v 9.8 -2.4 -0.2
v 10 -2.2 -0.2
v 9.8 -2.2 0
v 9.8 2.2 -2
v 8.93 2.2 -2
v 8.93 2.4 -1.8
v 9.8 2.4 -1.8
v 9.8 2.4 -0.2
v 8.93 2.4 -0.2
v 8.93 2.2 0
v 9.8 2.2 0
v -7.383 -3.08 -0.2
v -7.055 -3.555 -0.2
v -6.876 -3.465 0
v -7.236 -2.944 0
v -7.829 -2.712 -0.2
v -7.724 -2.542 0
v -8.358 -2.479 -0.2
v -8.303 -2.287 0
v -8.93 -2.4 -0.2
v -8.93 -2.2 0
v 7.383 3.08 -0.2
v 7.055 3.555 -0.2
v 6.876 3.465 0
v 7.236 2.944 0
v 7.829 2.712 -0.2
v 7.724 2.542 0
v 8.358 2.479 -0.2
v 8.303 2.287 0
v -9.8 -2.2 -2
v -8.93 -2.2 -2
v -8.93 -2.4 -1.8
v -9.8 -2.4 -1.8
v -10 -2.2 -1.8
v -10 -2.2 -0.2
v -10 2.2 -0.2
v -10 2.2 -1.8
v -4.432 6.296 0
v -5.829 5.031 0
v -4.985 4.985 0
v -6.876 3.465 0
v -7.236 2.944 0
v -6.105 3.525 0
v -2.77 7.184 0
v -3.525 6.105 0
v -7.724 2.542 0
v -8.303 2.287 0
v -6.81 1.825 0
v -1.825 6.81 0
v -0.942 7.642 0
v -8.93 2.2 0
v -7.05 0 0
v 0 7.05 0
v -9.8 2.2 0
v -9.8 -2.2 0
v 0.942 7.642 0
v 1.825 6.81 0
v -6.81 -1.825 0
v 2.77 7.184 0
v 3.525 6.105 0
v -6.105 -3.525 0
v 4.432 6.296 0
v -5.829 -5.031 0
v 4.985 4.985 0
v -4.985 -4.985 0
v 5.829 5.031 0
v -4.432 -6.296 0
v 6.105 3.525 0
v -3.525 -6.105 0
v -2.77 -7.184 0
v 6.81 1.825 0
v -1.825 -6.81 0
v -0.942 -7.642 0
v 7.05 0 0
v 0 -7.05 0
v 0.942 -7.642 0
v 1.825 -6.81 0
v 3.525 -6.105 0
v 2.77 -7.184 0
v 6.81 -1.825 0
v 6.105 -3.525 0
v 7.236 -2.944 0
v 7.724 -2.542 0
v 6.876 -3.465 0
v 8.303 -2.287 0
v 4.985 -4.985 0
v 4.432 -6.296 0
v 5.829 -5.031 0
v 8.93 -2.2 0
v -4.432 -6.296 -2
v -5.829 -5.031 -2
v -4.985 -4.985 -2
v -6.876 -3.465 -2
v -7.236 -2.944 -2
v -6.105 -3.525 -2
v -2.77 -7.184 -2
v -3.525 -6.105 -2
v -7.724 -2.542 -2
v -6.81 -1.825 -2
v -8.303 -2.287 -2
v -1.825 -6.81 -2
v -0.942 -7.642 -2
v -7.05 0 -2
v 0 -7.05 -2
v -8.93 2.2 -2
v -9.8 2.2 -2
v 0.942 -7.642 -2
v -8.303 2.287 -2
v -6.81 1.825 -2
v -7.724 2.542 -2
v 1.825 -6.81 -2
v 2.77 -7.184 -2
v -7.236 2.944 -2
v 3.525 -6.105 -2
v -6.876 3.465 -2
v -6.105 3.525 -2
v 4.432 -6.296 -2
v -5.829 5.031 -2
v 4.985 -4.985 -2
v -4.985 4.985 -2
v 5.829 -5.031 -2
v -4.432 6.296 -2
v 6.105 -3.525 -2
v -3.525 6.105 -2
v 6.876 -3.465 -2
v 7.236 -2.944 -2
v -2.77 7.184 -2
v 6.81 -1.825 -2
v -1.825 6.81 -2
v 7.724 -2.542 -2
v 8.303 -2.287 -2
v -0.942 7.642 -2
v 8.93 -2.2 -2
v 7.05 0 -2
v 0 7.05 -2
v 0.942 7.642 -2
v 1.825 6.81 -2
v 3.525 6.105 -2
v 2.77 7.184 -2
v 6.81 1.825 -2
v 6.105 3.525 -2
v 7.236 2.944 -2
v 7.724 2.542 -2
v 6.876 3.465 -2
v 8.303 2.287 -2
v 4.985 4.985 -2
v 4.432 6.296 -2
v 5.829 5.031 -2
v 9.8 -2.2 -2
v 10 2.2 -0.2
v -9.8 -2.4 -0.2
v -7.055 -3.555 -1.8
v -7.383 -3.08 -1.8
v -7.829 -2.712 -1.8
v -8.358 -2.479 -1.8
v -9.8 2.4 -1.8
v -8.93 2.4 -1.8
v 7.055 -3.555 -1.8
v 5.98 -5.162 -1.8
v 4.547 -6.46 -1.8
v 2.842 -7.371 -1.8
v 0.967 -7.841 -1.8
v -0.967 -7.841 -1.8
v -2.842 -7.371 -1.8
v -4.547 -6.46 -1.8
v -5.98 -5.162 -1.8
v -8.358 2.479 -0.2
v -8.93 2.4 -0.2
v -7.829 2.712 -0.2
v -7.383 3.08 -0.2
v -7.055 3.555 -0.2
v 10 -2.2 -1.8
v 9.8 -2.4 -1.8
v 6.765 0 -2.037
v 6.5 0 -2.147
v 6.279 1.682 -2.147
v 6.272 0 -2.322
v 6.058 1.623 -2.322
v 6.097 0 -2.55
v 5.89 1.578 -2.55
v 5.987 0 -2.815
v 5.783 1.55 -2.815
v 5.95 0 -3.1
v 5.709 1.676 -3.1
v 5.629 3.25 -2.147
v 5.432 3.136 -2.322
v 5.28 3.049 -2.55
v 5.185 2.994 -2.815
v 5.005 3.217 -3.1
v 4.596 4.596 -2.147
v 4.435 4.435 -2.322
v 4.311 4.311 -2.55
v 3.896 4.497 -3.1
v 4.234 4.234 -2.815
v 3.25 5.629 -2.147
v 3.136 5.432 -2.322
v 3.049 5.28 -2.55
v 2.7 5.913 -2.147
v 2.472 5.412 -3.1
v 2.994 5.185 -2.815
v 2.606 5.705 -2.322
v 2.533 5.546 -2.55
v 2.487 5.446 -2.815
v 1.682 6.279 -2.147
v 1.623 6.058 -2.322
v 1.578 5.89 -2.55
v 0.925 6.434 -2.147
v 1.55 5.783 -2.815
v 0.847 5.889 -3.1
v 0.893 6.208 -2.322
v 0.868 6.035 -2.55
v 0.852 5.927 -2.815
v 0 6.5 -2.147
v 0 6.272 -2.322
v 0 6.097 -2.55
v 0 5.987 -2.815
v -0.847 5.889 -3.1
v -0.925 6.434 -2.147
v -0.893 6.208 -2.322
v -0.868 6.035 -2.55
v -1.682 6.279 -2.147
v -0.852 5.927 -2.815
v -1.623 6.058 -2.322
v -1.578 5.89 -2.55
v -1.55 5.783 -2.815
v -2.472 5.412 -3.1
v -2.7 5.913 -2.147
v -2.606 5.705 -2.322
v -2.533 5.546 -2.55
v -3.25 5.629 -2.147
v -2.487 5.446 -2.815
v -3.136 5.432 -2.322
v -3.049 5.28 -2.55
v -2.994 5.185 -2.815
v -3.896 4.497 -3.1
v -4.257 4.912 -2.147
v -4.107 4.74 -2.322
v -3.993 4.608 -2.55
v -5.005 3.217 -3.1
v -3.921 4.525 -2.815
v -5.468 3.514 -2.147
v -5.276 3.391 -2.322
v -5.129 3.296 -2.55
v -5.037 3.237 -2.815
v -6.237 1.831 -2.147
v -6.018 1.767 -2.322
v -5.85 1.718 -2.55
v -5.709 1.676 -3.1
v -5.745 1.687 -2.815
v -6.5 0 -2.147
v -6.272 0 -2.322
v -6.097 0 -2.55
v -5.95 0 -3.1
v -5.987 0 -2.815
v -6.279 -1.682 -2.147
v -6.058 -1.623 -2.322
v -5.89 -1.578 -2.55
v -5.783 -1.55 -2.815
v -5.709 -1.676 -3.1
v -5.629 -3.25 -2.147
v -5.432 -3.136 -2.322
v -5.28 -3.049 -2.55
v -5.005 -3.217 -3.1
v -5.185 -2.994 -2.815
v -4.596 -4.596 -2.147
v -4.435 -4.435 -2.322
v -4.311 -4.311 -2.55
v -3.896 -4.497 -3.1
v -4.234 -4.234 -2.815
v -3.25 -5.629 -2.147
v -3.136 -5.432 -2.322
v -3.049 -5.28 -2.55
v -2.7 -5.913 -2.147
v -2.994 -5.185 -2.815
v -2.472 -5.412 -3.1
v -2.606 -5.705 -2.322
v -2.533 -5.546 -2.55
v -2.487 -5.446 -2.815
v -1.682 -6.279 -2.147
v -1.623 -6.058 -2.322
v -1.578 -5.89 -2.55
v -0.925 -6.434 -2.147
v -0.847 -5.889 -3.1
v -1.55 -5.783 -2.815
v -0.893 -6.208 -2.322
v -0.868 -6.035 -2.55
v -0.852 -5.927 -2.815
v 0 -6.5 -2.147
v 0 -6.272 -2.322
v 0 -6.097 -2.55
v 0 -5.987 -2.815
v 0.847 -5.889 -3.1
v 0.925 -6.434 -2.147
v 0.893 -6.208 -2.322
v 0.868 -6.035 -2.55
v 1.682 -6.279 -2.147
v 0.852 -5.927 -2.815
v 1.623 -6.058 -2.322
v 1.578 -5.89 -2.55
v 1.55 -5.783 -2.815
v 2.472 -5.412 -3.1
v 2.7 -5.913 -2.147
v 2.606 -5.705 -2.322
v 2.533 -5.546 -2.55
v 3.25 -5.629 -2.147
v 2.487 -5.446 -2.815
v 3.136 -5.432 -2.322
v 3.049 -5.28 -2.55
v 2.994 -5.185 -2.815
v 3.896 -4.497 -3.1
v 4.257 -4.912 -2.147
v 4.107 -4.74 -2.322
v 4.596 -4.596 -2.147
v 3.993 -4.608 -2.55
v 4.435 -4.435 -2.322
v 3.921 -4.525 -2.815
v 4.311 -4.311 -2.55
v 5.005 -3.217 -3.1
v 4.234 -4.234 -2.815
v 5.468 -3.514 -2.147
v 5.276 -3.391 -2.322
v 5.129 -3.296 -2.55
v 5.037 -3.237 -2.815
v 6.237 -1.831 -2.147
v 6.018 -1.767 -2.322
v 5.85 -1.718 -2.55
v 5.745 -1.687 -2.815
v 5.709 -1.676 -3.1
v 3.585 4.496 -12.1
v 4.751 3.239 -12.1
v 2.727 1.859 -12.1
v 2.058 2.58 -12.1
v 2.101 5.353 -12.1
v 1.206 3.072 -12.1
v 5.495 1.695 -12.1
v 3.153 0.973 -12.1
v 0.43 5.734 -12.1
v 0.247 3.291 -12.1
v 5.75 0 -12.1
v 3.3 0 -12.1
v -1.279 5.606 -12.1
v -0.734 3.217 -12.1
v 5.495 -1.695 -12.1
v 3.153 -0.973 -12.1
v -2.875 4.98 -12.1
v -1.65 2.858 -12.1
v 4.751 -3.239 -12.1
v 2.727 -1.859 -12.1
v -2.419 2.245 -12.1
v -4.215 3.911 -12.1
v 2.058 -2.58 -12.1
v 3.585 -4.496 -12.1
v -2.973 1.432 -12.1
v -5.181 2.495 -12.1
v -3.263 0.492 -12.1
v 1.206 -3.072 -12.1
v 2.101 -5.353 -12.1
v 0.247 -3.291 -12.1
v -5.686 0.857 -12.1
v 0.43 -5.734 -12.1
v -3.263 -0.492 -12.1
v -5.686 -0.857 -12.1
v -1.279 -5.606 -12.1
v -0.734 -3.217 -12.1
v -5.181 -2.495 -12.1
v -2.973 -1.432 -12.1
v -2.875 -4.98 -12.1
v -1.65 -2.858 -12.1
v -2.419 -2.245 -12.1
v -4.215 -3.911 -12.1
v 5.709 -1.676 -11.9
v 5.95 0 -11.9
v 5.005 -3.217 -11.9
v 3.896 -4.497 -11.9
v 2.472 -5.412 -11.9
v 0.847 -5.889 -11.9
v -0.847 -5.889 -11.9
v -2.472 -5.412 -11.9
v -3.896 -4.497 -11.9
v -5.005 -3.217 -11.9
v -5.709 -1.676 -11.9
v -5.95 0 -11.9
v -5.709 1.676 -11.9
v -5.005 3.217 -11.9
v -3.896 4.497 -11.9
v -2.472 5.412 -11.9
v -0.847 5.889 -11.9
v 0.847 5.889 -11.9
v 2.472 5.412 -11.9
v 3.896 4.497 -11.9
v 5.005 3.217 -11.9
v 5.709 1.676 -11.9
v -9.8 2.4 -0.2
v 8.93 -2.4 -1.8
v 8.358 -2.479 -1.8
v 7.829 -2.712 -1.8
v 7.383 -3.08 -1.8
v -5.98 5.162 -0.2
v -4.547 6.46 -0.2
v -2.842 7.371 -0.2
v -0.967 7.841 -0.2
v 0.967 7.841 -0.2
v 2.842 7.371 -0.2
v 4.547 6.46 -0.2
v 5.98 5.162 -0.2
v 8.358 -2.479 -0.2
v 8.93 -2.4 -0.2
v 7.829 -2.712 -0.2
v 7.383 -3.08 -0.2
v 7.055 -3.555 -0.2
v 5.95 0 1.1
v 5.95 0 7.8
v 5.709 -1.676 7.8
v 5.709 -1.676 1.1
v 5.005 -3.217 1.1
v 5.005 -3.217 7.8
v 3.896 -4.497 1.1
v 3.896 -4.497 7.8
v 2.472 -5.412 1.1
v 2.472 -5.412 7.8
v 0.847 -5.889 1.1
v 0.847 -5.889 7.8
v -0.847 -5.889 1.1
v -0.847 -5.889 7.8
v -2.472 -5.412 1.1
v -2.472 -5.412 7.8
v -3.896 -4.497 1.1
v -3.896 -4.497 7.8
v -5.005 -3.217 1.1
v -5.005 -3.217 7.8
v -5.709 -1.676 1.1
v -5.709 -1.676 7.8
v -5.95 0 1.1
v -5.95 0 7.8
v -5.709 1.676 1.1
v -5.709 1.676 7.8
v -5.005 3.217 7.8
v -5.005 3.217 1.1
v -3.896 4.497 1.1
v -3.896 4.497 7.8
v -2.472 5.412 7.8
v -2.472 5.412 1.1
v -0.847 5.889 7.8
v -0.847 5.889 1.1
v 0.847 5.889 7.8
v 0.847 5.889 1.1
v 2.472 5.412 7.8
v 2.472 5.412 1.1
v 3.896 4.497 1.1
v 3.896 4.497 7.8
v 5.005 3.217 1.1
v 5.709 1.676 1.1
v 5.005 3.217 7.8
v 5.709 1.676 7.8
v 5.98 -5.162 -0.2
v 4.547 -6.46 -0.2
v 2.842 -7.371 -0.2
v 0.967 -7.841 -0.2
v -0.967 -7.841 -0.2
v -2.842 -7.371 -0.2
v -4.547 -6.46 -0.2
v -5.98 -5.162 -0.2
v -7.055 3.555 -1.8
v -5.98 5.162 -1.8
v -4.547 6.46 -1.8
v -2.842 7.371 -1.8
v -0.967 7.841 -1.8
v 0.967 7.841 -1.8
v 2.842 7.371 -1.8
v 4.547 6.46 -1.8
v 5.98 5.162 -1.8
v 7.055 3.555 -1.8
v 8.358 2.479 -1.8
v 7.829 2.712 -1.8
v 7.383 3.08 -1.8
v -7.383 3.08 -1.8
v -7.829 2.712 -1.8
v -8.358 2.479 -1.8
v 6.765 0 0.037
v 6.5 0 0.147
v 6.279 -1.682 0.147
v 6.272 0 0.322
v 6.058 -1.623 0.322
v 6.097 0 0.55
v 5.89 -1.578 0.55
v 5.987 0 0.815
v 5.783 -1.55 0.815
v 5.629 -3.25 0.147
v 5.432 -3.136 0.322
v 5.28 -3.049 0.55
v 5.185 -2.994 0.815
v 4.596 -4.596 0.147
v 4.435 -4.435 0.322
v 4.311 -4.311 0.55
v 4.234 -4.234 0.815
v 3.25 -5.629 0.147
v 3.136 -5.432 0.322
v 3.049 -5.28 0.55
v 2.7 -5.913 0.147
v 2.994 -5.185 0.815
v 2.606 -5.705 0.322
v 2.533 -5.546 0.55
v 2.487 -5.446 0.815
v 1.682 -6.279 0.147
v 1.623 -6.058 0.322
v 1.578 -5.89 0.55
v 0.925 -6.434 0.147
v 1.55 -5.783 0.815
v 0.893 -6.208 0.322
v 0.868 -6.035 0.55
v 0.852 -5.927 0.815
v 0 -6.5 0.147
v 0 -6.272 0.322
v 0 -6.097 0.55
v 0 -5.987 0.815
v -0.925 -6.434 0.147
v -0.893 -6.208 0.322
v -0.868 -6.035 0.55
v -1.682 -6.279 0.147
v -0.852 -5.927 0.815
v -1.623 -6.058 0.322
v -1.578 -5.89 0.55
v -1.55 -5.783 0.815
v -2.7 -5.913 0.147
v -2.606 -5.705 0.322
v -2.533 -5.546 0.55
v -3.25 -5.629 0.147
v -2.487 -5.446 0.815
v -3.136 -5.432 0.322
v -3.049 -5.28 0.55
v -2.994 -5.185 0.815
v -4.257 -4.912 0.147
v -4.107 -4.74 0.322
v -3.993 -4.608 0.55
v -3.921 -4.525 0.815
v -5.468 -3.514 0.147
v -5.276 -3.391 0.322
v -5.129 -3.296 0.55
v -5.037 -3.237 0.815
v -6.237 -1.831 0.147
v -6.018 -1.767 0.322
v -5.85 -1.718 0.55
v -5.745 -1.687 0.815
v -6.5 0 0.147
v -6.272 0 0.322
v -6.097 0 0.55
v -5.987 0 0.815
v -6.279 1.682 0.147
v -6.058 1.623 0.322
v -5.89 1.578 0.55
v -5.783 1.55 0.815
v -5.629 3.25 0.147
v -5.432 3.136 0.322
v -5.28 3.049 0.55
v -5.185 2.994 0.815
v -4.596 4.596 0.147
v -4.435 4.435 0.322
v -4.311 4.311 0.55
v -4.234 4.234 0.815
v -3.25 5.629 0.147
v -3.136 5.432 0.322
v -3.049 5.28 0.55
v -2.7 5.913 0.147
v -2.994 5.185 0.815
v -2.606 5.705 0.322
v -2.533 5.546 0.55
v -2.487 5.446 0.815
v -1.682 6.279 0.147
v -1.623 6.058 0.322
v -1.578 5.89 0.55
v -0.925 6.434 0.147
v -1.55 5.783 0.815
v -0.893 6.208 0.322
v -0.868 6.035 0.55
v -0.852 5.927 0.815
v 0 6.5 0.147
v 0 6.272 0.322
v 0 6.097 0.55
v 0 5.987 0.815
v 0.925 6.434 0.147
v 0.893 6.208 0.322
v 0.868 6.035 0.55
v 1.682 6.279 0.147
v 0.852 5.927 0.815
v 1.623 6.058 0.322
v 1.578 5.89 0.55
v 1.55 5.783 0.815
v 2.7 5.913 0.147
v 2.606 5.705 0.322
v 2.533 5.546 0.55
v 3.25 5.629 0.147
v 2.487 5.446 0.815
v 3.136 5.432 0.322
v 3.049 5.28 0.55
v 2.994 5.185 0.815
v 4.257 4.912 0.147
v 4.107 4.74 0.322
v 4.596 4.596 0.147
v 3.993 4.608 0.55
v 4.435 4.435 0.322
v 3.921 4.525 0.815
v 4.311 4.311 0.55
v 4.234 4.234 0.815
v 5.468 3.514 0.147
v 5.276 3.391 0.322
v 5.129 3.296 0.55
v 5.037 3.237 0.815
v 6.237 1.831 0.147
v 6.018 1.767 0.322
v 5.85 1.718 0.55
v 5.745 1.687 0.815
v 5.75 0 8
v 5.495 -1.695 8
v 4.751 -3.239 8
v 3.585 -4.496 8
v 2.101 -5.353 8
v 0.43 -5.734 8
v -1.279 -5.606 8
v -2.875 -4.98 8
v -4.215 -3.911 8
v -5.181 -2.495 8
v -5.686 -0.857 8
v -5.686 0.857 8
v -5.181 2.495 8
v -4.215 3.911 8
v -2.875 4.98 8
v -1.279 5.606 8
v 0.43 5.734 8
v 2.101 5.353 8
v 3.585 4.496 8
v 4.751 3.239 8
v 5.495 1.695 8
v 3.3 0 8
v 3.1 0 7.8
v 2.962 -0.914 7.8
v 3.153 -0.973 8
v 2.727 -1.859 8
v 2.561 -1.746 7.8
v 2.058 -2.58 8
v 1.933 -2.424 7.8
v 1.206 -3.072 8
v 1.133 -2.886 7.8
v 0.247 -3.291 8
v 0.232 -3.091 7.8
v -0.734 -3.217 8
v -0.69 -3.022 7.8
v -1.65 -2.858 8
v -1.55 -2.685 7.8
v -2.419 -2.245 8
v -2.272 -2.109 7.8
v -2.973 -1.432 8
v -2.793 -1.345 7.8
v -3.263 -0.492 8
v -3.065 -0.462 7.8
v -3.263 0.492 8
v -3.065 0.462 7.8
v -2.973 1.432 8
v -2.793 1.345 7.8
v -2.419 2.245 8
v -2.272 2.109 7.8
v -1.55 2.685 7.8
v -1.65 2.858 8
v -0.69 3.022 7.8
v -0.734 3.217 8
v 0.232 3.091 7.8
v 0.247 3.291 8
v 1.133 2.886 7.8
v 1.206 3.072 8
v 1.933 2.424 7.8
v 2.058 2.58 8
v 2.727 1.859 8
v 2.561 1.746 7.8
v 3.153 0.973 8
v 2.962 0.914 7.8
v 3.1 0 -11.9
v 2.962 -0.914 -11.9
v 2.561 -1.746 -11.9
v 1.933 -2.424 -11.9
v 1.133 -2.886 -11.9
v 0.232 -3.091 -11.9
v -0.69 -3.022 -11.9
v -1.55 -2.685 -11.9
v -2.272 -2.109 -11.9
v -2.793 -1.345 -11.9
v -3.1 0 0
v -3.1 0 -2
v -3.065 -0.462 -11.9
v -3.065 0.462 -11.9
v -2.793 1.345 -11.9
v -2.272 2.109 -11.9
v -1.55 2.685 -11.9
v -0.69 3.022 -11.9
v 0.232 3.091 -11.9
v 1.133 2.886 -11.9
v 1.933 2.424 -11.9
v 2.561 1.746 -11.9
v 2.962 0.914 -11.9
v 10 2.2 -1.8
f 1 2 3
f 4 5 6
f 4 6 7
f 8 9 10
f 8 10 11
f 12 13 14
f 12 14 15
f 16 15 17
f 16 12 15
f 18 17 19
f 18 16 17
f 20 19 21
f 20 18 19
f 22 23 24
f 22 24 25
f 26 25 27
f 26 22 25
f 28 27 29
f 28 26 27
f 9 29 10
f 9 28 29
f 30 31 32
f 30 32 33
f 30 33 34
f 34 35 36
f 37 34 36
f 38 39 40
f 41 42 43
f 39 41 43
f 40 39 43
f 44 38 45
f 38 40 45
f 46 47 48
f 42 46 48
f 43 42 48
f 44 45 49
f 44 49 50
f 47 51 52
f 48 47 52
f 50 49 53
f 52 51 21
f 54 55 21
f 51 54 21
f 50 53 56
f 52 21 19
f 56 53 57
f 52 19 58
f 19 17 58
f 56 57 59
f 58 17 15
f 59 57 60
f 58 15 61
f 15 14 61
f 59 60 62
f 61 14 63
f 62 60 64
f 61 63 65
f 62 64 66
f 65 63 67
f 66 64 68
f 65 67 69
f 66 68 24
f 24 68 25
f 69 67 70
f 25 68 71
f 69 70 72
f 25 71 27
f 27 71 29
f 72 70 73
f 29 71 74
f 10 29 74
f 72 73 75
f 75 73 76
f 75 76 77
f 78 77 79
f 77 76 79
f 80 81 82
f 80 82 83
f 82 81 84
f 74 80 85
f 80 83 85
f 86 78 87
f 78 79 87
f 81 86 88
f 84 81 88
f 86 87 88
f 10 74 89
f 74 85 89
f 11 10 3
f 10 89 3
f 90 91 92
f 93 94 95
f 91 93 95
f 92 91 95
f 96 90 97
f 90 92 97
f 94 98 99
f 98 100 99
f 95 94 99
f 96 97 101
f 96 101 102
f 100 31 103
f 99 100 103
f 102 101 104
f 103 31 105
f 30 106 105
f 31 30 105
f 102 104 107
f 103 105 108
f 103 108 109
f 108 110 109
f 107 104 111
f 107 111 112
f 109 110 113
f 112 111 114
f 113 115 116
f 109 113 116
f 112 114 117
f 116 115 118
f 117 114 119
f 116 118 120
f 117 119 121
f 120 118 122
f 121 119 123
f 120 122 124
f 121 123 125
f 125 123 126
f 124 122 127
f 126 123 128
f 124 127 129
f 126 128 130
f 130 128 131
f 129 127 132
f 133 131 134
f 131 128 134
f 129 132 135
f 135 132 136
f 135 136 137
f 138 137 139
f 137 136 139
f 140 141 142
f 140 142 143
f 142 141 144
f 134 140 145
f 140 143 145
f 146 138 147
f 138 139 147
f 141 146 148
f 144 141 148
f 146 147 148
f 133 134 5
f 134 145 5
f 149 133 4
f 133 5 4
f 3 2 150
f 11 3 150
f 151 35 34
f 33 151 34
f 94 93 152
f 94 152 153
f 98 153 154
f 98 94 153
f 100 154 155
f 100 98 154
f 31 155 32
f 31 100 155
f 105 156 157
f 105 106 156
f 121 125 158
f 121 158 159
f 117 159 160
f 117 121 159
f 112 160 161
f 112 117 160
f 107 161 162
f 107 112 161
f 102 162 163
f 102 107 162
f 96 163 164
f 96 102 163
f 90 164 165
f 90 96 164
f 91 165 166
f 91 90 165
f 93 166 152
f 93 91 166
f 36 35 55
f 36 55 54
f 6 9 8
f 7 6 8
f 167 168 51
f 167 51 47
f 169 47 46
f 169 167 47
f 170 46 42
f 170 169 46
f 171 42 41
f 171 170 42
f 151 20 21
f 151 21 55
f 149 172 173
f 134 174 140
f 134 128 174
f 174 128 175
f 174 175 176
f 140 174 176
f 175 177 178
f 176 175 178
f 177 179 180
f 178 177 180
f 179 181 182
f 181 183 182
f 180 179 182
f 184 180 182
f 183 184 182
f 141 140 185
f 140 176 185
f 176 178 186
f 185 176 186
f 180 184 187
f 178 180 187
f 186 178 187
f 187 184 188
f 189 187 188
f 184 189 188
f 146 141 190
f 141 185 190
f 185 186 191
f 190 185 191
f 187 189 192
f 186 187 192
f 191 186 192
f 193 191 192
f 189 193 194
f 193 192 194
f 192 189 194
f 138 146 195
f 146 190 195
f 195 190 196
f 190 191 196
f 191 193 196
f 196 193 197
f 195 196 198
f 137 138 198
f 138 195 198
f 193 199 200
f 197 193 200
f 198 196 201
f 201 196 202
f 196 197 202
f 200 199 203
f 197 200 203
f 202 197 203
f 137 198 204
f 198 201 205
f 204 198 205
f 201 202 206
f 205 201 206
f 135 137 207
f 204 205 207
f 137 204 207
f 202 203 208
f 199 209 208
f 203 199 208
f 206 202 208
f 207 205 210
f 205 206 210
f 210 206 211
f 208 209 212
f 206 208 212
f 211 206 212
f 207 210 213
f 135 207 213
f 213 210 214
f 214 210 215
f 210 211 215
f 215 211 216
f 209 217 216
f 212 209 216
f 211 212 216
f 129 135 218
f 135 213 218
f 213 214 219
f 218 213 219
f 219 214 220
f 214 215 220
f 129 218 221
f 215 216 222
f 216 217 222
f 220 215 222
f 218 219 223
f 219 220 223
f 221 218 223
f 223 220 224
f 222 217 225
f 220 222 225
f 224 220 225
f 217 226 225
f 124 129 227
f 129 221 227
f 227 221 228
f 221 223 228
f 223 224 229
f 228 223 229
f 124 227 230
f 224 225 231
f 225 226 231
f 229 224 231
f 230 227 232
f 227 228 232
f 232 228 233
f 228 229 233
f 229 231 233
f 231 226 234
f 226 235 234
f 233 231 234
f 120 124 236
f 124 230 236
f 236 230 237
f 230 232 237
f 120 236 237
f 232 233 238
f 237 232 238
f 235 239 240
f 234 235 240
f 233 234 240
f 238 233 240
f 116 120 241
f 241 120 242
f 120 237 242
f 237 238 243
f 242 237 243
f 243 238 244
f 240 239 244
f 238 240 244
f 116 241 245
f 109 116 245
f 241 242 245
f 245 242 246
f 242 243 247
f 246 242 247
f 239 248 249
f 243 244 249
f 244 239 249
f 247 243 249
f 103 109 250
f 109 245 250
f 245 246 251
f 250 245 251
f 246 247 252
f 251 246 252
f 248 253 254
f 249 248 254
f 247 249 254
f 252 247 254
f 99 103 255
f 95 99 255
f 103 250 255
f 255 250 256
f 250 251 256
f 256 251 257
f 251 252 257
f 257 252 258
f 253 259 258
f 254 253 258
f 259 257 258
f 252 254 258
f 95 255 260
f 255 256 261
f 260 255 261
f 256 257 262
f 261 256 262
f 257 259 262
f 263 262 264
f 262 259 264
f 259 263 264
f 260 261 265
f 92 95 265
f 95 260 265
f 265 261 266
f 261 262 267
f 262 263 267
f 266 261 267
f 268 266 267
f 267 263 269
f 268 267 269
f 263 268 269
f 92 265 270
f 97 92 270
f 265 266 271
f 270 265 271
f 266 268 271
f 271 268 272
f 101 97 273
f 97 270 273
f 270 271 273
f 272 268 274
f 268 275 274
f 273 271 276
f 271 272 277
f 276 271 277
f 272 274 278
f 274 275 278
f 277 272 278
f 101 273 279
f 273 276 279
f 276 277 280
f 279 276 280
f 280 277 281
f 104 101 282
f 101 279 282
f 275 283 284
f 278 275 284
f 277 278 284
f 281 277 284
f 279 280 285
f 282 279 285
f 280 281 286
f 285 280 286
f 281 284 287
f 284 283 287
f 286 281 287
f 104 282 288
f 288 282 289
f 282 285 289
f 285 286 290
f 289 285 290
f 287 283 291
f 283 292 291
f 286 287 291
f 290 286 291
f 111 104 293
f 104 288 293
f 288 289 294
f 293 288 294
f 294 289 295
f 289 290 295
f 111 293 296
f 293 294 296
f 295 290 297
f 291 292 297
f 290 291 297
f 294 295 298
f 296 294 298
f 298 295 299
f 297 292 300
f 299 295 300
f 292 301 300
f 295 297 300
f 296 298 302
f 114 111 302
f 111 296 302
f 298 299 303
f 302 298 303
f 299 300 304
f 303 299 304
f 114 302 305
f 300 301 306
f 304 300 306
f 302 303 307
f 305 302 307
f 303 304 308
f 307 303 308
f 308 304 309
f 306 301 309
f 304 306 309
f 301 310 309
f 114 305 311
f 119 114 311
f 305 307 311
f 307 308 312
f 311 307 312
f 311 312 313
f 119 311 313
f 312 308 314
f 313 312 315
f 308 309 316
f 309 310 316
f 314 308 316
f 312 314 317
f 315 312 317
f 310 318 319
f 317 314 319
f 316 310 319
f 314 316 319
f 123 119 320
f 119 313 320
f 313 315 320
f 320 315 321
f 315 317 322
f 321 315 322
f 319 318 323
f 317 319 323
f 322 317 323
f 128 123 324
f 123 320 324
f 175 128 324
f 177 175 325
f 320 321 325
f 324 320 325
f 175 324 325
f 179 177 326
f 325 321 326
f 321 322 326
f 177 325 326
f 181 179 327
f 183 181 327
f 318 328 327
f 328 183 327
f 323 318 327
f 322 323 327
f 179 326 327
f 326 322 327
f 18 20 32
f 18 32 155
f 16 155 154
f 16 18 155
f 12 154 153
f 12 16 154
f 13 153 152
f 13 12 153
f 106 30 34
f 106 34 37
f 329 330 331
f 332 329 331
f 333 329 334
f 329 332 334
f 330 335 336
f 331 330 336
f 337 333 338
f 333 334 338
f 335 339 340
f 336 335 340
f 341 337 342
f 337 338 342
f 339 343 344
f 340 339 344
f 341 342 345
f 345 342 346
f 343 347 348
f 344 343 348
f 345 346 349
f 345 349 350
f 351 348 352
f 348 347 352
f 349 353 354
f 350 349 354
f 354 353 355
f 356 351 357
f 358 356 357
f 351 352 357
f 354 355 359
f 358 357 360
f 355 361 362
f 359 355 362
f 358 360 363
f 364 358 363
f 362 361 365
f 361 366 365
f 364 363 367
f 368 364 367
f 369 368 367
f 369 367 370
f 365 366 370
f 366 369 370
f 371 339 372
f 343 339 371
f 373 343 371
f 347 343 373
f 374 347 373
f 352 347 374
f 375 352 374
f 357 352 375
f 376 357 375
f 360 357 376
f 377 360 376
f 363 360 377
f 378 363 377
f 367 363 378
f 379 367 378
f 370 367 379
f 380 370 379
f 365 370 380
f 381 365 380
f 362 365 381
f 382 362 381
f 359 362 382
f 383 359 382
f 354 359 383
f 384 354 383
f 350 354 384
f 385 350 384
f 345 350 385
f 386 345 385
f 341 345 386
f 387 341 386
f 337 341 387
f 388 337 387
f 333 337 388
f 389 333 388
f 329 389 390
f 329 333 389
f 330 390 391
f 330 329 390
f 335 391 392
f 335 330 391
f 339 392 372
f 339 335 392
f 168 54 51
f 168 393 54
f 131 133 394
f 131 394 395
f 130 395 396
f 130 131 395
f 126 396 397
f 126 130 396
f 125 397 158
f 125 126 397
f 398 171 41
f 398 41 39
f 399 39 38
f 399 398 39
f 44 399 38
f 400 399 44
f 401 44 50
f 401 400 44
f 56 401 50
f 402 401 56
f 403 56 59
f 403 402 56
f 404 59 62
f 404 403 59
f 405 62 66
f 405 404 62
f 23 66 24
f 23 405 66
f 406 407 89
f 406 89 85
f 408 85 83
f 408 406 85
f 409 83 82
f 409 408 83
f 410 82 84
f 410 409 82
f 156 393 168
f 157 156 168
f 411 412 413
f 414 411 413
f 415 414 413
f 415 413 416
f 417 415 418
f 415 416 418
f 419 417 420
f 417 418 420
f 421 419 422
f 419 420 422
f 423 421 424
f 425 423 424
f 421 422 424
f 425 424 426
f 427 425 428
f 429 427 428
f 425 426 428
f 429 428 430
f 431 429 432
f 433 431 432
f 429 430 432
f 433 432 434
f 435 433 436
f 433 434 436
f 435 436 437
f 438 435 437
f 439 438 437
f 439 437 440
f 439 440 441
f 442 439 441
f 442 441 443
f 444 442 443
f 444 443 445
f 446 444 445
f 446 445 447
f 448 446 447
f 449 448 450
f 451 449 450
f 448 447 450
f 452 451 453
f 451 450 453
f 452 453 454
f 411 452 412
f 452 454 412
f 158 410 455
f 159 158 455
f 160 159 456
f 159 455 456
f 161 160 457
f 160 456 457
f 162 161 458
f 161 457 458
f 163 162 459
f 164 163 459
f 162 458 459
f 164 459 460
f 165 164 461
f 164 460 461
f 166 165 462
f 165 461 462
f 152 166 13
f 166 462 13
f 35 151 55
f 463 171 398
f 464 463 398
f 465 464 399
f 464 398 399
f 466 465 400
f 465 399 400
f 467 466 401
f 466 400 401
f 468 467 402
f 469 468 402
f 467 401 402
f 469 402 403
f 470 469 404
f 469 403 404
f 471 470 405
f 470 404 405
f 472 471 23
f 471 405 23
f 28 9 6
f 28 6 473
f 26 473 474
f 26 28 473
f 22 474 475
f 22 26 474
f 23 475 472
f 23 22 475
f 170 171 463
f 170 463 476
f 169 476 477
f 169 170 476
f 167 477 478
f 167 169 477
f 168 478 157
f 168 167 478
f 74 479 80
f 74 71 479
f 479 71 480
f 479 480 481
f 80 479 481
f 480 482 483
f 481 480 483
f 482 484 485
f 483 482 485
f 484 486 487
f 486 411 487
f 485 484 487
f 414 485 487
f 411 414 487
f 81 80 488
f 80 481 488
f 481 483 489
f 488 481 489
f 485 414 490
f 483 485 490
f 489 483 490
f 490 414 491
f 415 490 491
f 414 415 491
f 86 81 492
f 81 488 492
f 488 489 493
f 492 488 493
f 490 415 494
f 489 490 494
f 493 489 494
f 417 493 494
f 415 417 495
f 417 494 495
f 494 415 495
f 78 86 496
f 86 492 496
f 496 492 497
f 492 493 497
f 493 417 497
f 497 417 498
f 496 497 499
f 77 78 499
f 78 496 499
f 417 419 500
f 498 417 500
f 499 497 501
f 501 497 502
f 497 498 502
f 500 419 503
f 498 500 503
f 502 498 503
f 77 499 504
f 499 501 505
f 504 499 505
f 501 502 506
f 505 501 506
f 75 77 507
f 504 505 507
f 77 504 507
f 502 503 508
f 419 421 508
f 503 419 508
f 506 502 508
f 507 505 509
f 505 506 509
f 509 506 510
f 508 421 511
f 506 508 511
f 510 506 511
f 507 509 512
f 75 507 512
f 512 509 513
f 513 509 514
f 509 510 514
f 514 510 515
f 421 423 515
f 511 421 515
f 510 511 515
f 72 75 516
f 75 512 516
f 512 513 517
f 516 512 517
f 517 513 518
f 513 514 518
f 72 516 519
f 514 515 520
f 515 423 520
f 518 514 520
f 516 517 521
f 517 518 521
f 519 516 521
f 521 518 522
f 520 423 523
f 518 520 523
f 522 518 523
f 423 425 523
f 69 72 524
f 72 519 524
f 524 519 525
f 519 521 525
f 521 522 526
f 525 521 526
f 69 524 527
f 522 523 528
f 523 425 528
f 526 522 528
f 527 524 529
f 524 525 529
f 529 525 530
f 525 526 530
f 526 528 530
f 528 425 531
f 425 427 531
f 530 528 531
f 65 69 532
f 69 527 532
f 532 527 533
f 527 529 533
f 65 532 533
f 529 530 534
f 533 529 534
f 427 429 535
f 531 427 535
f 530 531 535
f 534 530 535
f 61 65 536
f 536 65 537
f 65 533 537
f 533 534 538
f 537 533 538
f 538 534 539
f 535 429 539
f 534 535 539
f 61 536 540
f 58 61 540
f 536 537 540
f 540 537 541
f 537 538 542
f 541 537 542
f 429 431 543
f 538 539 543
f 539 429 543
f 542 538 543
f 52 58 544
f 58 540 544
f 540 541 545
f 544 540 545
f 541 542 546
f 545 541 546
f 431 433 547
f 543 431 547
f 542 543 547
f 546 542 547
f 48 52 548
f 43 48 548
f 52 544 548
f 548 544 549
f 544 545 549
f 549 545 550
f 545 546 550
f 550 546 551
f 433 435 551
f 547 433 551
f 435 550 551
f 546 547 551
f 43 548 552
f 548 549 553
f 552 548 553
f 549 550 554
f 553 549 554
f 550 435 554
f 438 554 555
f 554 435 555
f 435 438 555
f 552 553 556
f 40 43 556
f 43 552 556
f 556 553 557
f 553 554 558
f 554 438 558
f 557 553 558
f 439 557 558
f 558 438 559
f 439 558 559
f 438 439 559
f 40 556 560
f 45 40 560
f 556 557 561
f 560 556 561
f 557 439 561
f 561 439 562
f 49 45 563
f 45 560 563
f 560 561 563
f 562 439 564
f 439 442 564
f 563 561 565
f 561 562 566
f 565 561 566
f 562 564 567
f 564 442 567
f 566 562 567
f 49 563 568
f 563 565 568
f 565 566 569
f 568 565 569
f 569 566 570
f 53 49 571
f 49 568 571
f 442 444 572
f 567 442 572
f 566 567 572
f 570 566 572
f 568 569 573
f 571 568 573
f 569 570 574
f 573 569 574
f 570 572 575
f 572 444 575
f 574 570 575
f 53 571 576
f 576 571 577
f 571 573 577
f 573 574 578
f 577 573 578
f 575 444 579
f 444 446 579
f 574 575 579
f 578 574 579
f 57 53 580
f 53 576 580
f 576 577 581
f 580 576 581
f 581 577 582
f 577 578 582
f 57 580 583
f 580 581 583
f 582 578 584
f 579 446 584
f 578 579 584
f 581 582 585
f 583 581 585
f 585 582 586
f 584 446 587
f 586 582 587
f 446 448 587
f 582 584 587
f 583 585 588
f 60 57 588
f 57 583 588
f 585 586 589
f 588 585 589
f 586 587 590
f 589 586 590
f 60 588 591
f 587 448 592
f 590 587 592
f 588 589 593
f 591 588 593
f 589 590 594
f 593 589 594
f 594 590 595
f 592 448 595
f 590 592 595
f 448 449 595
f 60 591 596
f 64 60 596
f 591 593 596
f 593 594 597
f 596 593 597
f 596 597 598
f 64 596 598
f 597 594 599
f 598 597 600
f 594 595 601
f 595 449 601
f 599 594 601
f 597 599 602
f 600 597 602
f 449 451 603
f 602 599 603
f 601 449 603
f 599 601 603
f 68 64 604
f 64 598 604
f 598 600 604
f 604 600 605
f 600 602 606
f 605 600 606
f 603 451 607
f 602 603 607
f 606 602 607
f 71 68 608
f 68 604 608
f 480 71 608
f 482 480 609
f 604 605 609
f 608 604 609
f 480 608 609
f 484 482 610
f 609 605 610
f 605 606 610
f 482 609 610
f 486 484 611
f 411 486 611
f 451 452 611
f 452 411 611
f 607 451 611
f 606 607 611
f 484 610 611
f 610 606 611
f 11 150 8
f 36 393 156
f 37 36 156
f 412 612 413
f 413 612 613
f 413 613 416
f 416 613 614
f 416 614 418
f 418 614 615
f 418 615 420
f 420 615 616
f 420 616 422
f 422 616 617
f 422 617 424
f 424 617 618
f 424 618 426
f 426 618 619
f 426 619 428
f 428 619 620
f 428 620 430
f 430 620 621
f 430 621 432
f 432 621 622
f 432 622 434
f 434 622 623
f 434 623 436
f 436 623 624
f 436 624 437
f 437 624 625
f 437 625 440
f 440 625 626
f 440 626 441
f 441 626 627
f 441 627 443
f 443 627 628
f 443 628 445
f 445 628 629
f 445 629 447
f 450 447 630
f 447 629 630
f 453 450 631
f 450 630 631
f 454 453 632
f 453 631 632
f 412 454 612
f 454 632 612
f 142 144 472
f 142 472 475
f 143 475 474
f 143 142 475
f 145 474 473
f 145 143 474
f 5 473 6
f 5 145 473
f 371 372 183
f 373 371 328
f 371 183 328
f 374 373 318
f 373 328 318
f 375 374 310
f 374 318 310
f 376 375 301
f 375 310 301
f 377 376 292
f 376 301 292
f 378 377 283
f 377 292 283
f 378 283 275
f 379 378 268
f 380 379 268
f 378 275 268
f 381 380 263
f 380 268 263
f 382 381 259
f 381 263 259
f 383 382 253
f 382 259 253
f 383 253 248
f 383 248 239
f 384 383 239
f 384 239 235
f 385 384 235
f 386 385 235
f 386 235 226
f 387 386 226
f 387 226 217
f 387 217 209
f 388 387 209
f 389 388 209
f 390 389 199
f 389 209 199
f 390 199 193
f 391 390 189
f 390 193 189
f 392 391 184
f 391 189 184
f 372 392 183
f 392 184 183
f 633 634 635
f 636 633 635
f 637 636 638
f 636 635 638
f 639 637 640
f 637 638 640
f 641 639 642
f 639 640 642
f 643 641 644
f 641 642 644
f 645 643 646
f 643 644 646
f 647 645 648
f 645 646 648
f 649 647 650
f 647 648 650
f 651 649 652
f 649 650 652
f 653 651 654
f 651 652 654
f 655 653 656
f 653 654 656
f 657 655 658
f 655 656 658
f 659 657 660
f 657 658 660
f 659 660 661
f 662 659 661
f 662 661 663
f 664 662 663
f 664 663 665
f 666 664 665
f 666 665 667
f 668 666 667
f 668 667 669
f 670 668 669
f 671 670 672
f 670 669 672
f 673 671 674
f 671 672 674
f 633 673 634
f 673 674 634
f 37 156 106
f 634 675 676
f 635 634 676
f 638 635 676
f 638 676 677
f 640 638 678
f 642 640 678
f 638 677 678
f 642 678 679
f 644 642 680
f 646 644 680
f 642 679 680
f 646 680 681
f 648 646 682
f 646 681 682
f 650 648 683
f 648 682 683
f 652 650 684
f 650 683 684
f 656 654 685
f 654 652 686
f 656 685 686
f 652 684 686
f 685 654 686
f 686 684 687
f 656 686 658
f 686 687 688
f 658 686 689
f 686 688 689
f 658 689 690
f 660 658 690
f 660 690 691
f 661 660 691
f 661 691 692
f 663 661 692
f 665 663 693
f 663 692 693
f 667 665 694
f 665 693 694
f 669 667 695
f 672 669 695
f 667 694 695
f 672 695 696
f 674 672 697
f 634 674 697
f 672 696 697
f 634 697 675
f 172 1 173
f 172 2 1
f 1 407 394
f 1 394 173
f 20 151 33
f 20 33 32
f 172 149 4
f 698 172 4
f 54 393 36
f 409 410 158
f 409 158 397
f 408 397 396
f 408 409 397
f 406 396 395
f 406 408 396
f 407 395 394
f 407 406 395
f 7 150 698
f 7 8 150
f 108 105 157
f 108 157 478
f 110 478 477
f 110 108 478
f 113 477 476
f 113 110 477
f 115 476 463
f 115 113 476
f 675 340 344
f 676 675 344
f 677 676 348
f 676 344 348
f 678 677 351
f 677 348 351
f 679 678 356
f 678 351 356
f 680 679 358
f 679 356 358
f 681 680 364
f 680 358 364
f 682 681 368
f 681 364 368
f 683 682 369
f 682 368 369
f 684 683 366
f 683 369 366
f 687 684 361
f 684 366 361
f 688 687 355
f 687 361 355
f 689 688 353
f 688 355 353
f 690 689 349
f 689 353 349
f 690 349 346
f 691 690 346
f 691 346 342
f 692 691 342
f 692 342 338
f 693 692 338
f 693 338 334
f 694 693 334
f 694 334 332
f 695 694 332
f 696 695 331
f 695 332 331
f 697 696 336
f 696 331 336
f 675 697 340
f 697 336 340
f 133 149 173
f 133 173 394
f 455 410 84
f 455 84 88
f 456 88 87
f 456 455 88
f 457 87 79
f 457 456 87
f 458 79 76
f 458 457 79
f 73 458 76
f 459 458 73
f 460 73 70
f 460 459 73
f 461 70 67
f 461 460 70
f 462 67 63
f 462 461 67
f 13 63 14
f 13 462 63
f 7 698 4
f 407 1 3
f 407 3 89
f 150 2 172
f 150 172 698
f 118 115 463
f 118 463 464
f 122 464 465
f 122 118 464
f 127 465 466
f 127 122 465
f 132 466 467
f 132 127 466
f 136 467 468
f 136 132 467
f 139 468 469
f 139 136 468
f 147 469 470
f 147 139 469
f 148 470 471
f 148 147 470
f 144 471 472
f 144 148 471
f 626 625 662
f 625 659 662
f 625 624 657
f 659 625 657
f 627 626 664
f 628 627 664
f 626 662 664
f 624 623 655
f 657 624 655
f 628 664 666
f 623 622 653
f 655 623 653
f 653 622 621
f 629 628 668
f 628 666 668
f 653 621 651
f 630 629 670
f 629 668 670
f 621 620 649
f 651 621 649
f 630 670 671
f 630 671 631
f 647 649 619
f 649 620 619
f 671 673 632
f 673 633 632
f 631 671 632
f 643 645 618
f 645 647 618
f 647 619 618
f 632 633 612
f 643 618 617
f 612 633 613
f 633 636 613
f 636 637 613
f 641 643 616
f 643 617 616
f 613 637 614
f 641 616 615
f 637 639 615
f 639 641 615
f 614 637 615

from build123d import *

# Parameters (mm, degrees)
F2_W     = 6.9
F2_H     = 4.8
F3_DEPTH = 2
F4_R     = 2.1
F5_SIZE  = 0.2
F6_R     = 1.1


# Not quite as in the source:
# - a feature names something its author has since deleted; it is built from what else it names


with BuildPart() as f1:
    # F0 (on Front) → F1 (revolve)
    with BuildSketch(Plane.XZ):
        Polygon((3.1, 0), (3.1, -12.1), (5.95, -12.1), (5.95, -2), (7.9, -2), (7.9, 0), (5.95, 0), (5.95, 8), (3.1, 8), align=None)
    revolve(axis=Axis((0, 0, -6.05), (0, 0, -1)))

    # F2 (on face) → F3 (join)
    with BuildSketch(Plane.XY):
        with Locations((6.55, 0)):
            Rectangle(F2_W, F2_H)
        with Locations((-6.55, 0)):
            Rectangle(F2_W, F2_H)
    extrude(amount=-F3_DEPTH)

    # F4
    f4_edges = [f1.edges().sort_by_distance(p)[0] for p in [
        (7.526619, -2.4, -1),
        (7.526619, 2.4, -1),
        (-7.526619, 2.4, -1),
        (-7.526619, -2.4, -1),
    ]]
    fillet(f4_edges, radius=F4_R)

    # F5
    f5_edges = [f1.edges().sort_by_distance(p)[0] for p in [
        (3.1, 0, -2.05),
        (-3.1, 0, -12.1),
        (-3.1, 0, 8),
        (-3.1, 0, -1),
        (10, -2.4, -1),
        (10, 2.4, -1),
        (10, 0, 0),
        (10, 0, -2),
        (0, -7.9, -2),
        (0, -7.9, 0),
        (9.465143, -2.4, 0),
        (9.465143, -2.4, -2),
        (9.465143, 2.4, 0),
        (9.465143, 2.4, -2),
        (-10, 2.4, -1),
        (-10, -2.4, -1),
        (-10, 0, 0),
        (-10, 0, -2),
        (-9.465143, -2.4, 0),
        (-9.465143, -2.4, -2),
        (-9.465143, 2.4, -2),
        (-9.465143, 2.4, 0),
        (-5.95, 0, 8),
        (-5.95, 0, -12.1),
        (7.829036, -2.711914, 0),
        (-7.829036, -2.711914, 0),
        (7.829036, 2.711914, 0),
        (0, 7.9, 0),
        (-7.829036, 2.711914, 0),
        (7.829036, -2.711914, -2),
        (-7.829036, -2.711914, -2),
        (7.829036, 2.711914, -2),
        (0, 7.9, -2),
        (-7.829036, 2.711914, -2),
    ]]
    chamfer(f5_edges, length=F5_SIZE)

    # F6
    f6_edges = [f1.edges().sort_by_distance(p)[0] for p in [
        (-5.95, 0, -2),
        (-5.95, 0, 0),
    ]]
    fillet(f6_edges, radius=F6_R)


solid = f1.part
